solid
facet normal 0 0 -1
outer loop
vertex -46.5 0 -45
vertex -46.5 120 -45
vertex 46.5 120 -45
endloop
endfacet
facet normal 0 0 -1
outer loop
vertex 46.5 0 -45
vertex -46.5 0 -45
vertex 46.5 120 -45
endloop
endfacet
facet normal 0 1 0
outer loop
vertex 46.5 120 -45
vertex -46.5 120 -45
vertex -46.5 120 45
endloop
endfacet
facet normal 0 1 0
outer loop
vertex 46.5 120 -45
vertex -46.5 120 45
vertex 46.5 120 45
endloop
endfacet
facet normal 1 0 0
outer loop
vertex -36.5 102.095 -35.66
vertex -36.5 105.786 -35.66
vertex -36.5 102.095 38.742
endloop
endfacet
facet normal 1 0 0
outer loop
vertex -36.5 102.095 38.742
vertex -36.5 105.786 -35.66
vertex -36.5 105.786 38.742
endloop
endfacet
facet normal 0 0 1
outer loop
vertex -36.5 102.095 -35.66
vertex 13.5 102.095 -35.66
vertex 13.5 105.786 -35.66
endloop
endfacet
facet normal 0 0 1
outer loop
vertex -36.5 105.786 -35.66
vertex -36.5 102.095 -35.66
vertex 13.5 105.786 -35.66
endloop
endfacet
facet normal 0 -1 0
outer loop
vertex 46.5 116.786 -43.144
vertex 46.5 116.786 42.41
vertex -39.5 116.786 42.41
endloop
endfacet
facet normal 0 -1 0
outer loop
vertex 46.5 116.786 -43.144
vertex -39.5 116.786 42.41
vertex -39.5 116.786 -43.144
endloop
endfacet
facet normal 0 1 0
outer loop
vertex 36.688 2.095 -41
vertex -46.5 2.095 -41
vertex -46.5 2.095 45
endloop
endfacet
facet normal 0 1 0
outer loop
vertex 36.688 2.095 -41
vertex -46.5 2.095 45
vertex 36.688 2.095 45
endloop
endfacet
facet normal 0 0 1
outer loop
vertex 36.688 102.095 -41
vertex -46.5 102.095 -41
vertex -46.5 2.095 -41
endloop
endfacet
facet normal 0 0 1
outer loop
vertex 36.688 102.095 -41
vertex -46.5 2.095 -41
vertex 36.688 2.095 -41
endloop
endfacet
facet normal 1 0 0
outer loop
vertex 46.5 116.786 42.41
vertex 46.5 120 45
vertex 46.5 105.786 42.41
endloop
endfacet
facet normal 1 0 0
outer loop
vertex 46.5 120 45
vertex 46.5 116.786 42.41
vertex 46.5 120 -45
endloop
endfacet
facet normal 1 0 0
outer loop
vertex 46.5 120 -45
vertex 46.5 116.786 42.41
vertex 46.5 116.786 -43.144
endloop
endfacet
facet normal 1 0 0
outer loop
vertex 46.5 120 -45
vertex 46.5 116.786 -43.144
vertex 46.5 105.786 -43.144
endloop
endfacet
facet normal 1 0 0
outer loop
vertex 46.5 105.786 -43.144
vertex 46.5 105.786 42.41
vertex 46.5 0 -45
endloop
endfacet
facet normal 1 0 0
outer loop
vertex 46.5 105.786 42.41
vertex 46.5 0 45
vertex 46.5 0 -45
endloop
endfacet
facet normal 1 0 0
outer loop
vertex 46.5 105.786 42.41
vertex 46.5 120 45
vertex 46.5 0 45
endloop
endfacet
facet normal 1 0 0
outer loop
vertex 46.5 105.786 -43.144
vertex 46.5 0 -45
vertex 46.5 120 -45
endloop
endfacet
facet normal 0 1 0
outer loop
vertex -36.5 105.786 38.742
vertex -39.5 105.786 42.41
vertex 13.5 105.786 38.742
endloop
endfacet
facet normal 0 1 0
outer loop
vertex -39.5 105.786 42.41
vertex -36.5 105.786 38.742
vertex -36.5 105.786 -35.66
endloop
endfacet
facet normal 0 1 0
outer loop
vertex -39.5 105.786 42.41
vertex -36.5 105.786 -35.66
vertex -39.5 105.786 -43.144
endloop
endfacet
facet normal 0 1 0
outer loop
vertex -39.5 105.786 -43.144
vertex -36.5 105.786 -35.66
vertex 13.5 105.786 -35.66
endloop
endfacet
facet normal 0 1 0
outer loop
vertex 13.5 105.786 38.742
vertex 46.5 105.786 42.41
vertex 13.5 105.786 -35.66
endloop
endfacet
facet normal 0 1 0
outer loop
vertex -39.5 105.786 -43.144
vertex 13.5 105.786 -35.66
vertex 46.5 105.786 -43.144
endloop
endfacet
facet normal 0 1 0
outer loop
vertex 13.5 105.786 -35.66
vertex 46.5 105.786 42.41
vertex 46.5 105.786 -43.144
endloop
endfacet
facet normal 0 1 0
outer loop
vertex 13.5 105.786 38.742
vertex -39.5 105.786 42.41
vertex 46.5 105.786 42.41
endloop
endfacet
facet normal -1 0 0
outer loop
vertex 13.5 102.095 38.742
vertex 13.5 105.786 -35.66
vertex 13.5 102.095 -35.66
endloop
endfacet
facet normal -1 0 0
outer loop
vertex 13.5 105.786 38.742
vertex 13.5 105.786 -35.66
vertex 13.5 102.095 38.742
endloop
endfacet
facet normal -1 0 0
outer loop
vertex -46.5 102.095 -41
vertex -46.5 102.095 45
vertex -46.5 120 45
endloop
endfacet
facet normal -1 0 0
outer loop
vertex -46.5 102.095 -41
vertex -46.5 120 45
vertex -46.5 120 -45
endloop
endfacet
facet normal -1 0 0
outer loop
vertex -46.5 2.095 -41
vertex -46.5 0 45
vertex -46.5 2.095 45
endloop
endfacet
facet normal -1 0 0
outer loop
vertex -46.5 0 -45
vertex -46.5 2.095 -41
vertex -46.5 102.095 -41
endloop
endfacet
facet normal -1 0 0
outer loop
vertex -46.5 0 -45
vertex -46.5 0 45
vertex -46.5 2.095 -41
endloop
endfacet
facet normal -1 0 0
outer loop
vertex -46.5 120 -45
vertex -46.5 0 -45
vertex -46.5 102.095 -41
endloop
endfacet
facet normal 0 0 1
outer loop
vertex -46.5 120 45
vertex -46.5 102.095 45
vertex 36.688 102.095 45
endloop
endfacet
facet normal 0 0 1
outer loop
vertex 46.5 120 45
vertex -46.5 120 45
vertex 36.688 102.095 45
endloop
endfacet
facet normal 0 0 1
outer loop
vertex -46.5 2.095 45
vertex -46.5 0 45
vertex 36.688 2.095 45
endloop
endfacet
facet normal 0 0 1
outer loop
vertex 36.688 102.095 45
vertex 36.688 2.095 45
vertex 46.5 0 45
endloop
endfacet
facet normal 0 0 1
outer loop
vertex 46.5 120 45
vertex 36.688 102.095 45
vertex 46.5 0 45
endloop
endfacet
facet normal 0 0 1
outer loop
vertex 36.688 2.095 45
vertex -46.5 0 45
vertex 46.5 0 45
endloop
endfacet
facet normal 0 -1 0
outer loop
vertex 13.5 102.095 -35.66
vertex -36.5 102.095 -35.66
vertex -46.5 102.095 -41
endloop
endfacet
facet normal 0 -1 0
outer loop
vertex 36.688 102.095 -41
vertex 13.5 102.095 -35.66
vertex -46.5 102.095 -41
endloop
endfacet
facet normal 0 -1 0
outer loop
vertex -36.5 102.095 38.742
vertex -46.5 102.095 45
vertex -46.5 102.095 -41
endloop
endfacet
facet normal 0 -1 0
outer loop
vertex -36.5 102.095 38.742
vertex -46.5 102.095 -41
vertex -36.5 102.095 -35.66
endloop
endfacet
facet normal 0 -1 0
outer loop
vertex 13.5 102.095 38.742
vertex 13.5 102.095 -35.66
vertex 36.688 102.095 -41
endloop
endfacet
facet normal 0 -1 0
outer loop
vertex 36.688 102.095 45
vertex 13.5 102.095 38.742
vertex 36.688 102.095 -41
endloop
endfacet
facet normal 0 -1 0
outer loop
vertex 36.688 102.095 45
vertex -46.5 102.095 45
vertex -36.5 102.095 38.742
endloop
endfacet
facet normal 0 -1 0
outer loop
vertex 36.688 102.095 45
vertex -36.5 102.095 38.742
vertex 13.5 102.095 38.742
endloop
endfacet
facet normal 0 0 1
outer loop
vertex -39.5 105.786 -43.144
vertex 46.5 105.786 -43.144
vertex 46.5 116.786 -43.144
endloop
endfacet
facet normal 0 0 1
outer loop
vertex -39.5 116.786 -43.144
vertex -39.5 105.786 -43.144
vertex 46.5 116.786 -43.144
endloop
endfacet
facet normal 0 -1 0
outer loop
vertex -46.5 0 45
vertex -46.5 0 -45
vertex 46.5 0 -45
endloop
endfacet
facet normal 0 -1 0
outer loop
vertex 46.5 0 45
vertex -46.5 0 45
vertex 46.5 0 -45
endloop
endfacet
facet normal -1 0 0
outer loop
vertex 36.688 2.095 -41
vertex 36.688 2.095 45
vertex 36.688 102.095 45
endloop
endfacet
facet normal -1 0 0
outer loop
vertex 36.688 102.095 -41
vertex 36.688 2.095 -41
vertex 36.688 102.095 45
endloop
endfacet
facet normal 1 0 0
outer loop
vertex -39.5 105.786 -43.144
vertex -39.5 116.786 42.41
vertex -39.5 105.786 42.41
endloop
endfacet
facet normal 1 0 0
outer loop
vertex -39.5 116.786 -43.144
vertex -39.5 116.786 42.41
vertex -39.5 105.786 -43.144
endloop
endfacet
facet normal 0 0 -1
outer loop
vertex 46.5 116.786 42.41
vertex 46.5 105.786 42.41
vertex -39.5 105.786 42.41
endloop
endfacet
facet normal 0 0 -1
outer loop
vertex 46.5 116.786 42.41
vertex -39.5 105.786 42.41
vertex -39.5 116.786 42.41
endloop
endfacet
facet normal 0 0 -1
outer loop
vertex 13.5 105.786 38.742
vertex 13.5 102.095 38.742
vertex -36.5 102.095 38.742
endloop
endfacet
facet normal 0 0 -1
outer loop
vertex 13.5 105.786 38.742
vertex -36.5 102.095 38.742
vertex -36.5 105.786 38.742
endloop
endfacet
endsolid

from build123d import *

# Parameters (mm, degrees)
SKETCH1_W           = 93
SKETCH1_H           = 90
BOSS_EXTRUDE2_DEPTH = 120
SKETCH4_W           = 83.188465172
SKETCH4_H           = 100
CUT_EXTRUDE2_DEPTH  = 86
SKETCH6_W           = 85.554409806
SKETCH6_H           = 11
CUT_EXTRUDE4_DEPTH  = 86
CUT_EXTRUDE5_START  = -10
SKETCH8_W           = 74.401519334
SKETCH8_H           = 6.478481014
CUT_EXTRUDE5_DEPTH  = 50


with BuildPart() as part:
    # Sketch1 → Boss-Extrude2 (new body)
    with BuildSketch(Plane(origin=(0, 0, 0), x_dir=(1, 0, 0), z_dir=(0, 1, 0))):
        Rectangle(SKETCH1_W, SKETCH1_H)
    extrude(amount=BOSS_EXTRUDE2_DEPTH)

    # Sketch4 → Cut-Extrude2 (cut)
    with BuildSketch(Plane.XY.offset(45)):
        with Locations((-4.905767414, 52.095291963)):
            Rectangle(SKETCH4_W, SKETCH4_H)
    extrude(amount=-CUT_EXTRUDE2_DEPTH, mode=Mode.SUBTRACT)

    # Sketch6 → Cut-Extrude4 (cut)
    with BuildSketch(Plane(origin=(46.5, 0, 0), x_dir=(0, 0, -1), z_dir=(1, 0, 0))):
        with Locations((0.366871397, 111.285550359)):
            Rectangle(SKETCH6_W, SKETCH6_H)
    extrude(amount=-CUT_EXTRUDE4_DEPTH, mode=Mode.SUBTRACT)

    # Sketch8 → Cut-Extrude5 (cut)
    with BuildSketch(Plane.ZY.offset(46.5).offset(CUT_EXTRUDE5_START)):
        with Locations((1.540859868, 105.33453247)):
            Rectangle(SKETCH8_W, SKETCH8_H)
    extrude(amount=-CUT_EXTRUDE5_DEPTH, mode=Mode.SUBTRACT)


solid = part.part
